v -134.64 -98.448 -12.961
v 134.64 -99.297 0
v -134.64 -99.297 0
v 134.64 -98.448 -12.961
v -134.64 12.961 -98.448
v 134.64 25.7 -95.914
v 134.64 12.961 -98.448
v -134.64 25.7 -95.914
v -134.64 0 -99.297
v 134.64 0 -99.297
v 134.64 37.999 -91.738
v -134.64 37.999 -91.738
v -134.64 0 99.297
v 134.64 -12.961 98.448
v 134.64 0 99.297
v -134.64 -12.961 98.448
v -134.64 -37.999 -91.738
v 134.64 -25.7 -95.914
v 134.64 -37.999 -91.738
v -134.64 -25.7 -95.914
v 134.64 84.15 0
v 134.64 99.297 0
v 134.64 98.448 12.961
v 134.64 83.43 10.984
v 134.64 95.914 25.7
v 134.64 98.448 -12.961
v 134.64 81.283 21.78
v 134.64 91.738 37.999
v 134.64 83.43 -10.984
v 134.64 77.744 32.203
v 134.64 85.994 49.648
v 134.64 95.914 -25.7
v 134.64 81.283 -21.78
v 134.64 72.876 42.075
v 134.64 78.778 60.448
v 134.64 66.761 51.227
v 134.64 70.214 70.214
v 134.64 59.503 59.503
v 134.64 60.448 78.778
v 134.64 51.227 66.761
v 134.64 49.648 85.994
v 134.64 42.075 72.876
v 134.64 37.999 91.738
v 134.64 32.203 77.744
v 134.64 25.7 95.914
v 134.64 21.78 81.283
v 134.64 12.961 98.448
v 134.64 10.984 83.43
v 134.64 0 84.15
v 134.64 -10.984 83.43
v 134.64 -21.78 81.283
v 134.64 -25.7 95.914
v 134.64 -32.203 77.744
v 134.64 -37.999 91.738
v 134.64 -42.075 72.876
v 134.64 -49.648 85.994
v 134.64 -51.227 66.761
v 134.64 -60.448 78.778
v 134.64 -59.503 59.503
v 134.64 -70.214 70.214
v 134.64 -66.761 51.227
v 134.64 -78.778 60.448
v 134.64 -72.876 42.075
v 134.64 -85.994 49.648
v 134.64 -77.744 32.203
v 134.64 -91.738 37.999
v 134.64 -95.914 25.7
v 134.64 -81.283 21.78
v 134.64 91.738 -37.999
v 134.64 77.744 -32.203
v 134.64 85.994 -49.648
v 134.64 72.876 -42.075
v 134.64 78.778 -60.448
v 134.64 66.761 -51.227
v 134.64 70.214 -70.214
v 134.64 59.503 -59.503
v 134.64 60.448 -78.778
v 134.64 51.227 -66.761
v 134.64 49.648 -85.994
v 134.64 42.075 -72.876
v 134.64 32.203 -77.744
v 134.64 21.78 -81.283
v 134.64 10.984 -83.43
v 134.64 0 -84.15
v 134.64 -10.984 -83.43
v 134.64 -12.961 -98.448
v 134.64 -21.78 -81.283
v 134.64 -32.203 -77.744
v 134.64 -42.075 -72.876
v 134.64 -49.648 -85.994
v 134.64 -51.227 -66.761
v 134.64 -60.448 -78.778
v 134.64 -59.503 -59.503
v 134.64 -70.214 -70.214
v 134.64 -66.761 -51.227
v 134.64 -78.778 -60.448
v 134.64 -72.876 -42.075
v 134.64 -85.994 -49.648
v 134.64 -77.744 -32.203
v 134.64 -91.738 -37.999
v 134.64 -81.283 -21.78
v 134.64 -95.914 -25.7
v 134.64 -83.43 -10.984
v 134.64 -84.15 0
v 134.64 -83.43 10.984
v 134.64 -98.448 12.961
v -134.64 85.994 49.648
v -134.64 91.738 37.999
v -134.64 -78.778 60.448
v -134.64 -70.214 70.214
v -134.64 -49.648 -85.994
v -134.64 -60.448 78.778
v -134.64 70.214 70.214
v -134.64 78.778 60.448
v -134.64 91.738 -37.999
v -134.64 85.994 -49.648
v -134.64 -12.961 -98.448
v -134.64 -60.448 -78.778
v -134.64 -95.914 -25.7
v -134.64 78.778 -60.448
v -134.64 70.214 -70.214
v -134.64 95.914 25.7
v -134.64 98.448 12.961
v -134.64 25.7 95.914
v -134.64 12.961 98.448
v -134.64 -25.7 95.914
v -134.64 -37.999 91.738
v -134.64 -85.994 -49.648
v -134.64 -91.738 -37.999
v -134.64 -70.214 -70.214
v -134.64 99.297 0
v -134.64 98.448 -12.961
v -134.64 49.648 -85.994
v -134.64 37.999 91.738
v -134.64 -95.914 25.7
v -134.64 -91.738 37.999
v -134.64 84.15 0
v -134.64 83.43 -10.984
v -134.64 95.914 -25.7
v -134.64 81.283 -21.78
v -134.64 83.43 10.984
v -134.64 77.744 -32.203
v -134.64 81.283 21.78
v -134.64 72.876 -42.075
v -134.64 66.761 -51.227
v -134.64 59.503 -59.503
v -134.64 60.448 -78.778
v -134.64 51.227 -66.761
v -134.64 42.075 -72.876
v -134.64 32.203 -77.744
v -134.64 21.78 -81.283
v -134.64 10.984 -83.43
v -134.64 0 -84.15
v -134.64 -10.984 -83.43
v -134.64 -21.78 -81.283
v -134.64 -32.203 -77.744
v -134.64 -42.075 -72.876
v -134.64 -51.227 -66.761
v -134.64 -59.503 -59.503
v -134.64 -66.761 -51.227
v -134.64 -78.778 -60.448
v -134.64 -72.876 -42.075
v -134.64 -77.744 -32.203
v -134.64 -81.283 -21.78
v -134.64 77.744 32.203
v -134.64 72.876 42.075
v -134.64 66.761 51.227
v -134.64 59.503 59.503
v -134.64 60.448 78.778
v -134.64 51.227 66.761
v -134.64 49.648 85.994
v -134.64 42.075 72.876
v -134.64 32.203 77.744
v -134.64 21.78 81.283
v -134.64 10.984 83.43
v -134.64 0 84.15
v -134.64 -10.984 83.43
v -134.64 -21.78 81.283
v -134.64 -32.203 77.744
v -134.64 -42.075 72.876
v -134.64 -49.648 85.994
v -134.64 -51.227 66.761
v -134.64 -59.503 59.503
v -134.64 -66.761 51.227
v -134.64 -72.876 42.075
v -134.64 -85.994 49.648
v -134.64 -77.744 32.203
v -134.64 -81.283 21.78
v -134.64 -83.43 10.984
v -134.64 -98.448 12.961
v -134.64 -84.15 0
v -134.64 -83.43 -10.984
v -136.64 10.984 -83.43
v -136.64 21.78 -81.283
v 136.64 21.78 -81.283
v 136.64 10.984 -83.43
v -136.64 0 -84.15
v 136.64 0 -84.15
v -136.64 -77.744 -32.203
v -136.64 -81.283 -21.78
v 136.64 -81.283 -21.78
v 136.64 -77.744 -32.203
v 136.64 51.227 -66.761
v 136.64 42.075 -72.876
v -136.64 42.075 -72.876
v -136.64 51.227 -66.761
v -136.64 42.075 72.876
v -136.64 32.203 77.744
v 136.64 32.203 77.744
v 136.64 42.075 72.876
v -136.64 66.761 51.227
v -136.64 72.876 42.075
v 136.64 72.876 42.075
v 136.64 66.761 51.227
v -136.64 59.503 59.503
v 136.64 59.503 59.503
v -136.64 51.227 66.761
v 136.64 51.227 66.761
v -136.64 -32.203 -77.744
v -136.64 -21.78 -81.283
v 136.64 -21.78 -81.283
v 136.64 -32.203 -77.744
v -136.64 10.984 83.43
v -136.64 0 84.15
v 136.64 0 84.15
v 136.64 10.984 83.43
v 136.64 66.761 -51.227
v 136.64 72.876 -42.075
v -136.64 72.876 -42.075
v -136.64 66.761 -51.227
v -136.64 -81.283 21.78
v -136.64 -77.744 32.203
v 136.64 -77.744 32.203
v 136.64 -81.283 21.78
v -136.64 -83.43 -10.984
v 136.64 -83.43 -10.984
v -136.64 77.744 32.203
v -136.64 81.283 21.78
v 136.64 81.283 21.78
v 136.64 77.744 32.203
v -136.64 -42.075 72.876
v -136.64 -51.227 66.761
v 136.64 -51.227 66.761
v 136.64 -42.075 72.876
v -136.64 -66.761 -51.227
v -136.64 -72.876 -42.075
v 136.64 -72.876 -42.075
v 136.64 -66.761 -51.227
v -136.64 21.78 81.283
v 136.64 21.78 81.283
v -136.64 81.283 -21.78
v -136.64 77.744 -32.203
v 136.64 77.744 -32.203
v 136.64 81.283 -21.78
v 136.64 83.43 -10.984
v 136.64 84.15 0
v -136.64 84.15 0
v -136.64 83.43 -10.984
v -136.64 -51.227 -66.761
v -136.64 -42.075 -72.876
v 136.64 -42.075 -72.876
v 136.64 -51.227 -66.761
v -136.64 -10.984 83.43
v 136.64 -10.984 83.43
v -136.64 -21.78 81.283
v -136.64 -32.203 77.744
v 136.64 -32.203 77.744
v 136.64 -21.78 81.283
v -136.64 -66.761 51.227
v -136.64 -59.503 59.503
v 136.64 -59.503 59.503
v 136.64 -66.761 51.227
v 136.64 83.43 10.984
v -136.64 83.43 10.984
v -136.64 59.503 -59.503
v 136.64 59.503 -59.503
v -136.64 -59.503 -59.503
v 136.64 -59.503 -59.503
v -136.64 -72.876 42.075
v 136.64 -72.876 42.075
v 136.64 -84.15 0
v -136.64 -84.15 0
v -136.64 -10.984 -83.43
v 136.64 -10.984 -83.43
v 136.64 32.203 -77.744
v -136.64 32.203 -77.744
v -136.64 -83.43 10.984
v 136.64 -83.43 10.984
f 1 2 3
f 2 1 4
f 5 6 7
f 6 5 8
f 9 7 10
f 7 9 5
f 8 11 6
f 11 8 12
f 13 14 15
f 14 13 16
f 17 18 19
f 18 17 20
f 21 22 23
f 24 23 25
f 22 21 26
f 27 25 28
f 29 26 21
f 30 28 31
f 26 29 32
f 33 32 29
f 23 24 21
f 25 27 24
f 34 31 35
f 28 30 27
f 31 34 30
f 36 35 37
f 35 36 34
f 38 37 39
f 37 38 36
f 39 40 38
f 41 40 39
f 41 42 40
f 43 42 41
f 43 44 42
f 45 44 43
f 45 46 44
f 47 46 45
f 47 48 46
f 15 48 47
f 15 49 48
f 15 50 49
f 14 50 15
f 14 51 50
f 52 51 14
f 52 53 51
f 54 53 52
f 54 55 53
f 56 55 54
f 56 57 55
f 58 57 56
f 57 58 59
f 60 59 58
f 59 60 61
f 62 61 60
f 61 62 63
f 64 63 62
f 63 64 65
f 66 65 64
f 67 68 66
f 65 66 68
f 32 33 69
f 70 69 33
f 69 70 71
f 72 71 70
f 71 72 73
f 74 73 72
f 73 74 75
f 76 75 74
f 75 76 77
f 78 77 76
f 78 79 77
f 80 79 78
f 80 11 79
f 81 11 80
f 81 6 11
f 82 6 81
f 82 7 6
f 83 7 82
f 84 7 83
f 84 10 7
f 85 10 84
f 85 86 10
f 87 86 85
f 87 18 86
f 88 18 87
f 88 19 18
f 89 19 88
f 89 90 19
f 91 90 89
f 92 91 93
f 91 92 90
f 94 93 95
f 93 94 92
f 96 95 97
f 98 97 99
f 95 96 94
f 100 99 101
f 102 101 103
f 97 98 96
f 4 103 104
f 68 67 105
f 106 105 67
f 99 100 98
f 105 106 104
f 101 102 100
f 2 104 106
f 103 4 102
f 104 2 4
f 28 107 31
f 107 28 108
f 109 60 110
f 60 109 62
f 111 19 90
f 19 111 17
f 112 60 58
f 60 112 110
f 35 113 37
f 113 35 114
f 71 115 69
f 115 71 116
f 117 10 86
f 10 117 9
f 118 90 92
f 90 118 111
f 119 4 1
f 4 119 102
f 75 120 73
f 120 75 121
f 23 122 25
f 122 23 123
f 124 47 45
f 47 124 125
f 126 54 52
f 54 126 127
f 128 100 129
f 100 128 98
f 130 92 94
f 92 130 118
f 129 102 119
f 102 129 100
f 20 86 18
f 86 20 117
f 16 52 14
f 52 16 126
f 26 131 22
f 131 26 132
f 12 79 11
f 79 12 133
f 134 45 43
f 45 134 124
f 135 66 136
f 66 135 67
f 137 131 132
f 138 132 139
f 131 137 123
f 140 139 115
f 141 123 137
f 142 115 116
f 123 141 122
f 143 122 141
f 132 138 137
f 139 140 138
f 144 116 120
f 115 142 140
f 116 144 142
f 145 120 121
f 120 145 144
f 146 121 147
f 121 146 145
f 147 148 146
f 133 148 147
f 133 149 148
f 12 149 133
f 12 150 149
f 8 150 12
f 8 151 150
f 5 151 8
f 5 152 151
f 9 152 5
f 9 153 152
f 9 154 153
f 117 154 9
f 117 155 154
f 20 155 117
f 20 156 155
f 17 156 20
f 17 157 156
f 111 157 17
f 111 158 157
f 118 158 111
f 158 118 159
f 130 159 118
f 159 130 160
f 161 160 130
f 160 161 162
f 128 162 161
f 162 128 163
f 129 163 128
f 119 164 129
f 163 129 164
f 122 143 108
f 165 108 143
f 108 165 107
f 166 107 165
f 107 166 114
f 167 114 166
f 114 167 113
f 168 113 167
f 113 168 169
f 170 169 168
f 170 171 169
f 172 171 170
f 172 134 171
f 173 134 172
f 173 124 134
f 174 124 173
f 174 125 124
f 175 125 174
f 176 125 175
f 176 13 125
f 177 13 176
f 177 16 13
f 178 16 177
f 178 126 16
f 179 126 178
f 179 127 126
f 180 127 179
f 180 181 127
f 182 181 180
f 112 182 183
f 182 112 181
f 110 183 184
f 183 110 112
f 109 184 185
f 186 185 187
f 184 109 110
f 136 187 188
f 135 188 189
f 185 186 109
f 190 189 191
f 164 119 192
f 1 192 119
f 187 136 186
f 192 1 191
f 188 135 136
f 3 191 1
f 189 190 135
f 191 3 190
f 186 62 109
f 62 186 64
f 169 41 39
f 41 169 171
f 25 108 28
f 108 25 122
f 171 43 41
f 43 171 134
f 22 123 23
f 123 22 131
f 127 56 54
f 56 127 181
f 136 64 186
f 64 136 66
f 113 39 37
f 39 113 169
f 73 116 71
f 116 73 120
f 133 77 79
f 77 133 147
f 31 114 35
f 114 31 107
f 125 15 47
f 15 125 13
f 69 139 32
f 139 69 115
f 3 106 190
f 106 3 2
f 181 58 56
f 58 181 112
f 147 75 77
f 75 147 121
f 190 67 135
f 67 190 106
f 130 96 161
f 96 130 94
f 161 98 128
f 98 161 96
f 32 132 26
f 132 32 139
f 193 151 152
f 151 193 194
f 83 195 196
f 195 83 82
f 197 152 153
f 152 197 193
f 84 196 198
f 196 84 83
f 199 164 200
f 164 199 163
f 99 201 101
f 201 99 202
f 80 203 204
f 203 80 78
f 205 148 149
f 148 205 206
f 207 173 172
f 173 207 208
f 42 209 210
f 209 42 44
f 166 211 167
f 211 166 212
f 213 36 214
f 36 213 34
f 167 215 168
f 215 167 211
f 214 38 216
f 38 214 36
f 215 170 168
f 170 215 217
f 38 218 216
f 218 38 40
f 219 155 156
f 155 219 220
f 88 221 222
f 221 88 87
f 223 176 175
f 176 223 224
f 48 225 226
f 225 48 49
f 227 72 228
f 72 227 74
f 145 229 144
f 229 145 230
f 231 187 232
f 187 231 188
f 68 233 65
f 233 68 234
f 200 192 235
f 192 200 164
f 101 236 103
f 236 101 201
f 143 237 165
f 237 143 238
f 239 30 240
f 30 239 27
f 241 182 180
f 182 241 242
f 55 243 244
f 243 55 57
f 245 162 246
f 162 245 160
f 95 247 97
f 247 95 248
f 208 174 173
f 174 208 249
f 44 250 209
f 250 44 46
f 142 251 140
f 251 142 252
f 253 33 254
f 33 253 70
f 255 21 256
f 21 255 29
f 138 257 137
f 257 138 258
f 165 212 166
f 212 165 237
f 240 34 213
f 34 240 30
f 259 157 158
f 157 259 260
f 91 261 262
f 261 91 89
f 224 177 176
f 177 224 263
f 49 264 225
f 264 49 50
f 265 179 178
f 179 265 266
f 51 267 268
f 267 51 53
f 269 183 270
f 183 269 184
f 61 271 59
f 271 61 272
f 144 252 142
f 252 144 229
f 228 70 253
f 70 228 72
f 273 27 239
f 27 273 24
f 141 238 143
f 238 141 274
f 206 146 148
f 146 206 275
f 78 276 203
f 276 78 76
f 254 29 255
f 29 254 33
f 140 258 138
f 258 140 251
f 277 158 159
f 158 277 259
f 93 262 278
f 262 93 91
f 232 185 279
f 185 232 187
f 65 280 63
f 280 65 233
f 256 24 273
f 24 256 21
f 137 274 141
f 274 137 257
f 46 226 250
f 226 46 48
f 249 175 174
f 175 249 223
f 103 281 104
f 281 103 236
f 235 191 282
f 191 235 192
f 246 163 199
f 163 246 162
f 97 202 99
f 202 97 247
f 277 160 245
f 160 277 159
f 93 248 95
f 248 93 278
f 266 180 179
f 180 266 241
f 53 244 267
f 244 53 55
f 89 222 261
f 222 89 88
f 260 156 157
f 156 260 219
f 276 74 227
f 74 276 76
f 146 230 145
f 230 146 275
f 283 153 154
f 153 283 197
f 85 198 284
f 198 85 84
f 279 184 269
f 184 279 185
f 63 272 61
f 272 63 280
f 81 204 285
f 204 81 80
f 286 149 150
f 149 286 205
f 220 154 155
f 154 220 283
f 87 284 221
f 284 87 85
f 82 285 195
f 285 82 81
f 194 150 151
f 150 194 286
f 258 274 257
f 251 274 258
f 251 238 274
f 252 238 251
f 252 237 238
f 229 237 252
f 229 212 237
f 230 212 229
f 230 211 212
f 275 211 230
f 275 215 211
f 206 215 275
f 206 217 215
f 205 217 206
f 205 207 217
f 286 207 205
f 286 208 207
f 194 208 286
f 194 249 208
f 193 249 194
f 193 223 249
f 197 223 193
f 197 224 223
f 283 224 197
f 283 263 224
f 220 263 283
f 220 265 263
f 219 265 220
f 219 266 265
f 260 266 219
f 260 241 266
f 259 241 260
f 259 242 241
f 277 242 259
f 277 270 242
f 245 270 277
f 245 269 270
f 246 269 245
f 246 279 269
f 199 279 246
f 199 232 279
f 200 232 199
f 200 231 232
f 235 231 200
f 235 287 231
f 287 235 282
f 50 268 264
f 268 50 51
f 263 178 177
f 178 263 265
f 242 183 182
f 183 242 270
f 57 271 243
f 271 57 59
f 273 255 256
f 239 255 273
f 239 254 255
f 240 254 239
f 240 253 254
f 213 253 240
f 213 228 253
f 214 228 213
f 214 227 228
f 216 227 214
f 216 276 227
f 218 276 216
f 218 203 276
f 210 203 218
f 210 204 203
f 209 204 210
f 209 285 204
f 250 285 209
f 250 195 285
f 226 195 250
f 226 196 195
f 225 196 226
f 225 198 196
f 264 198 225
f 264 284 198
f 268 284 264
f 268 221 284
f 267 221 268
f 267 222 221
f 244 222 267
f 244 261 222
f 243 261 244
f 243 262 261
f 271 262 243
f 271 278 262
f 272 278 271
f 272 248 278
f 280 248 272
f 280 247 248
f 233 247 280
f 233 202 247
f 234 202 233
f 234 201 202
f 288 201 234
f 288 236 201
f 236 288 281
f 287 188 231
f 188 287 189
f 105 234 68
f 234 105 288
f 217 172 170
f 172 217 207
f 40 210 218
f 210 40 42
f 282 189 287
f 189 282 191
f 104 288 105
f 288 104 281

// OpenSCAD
// Auto-generated by scripts/author_from_manifest.py (Phase D.3).
// Source: data/phase_d_manifest.json (sku_intent='victaulic-009-flexible-coupling-6in').
// Do not hand-edit — regenerate from the manifest.
//
// @part victaulic_009_flexible_coupling_6in
// @kind fitting
// @category fitting.coupling
// @display-name "Victaulic FireLock Style 009N Flexible Coupling 6\""
// @mfg victaulic
// @mfg-pn Style_009N_6in
// @listing UL FM
// @price-usd 52.00
// @install-minutes 6
// @crew journeyman
// @param size_in number default=6 label="Size" unit="in"
// @port inlet position=[-0.05,0,0] direction=[-1,0,0] style=grooved size_in=6 role=run_a
// @port outlet position=[0.05,0,0] direction=[1,0,0] style=grooved size_in=6 role=run_b

size_in = 6.0;

function od_mm(nps) =
    nps ==   1  ? 33.4 :
    nps == 1.25 ? 42.2 :
    nps == 1.5  ? 48.3 :
    nps ==   2  ? 60.3 :
    nps == 2.5  ? 73.0 :
    nps ==   3  ? 88.9 :
    nps ==   4  ? 114.3 :
    nps ==   5  ? 141.3 :
    nps ==   6  ? 168.3 :
    nps ==   8  ? 219.1 :
    nps ==  10  ? 273.0 : 60.3;

od = od_mm(size_in);
len_mm = od * 1.6;

rotate([0, 90, 0])
    union() {
        cylinder(h = len_mm, d = od * 1.18, center = true, $fn = 48);
        cylinder(h = len_mm + 4, d = od, center = true, $fn = 48);
    }
